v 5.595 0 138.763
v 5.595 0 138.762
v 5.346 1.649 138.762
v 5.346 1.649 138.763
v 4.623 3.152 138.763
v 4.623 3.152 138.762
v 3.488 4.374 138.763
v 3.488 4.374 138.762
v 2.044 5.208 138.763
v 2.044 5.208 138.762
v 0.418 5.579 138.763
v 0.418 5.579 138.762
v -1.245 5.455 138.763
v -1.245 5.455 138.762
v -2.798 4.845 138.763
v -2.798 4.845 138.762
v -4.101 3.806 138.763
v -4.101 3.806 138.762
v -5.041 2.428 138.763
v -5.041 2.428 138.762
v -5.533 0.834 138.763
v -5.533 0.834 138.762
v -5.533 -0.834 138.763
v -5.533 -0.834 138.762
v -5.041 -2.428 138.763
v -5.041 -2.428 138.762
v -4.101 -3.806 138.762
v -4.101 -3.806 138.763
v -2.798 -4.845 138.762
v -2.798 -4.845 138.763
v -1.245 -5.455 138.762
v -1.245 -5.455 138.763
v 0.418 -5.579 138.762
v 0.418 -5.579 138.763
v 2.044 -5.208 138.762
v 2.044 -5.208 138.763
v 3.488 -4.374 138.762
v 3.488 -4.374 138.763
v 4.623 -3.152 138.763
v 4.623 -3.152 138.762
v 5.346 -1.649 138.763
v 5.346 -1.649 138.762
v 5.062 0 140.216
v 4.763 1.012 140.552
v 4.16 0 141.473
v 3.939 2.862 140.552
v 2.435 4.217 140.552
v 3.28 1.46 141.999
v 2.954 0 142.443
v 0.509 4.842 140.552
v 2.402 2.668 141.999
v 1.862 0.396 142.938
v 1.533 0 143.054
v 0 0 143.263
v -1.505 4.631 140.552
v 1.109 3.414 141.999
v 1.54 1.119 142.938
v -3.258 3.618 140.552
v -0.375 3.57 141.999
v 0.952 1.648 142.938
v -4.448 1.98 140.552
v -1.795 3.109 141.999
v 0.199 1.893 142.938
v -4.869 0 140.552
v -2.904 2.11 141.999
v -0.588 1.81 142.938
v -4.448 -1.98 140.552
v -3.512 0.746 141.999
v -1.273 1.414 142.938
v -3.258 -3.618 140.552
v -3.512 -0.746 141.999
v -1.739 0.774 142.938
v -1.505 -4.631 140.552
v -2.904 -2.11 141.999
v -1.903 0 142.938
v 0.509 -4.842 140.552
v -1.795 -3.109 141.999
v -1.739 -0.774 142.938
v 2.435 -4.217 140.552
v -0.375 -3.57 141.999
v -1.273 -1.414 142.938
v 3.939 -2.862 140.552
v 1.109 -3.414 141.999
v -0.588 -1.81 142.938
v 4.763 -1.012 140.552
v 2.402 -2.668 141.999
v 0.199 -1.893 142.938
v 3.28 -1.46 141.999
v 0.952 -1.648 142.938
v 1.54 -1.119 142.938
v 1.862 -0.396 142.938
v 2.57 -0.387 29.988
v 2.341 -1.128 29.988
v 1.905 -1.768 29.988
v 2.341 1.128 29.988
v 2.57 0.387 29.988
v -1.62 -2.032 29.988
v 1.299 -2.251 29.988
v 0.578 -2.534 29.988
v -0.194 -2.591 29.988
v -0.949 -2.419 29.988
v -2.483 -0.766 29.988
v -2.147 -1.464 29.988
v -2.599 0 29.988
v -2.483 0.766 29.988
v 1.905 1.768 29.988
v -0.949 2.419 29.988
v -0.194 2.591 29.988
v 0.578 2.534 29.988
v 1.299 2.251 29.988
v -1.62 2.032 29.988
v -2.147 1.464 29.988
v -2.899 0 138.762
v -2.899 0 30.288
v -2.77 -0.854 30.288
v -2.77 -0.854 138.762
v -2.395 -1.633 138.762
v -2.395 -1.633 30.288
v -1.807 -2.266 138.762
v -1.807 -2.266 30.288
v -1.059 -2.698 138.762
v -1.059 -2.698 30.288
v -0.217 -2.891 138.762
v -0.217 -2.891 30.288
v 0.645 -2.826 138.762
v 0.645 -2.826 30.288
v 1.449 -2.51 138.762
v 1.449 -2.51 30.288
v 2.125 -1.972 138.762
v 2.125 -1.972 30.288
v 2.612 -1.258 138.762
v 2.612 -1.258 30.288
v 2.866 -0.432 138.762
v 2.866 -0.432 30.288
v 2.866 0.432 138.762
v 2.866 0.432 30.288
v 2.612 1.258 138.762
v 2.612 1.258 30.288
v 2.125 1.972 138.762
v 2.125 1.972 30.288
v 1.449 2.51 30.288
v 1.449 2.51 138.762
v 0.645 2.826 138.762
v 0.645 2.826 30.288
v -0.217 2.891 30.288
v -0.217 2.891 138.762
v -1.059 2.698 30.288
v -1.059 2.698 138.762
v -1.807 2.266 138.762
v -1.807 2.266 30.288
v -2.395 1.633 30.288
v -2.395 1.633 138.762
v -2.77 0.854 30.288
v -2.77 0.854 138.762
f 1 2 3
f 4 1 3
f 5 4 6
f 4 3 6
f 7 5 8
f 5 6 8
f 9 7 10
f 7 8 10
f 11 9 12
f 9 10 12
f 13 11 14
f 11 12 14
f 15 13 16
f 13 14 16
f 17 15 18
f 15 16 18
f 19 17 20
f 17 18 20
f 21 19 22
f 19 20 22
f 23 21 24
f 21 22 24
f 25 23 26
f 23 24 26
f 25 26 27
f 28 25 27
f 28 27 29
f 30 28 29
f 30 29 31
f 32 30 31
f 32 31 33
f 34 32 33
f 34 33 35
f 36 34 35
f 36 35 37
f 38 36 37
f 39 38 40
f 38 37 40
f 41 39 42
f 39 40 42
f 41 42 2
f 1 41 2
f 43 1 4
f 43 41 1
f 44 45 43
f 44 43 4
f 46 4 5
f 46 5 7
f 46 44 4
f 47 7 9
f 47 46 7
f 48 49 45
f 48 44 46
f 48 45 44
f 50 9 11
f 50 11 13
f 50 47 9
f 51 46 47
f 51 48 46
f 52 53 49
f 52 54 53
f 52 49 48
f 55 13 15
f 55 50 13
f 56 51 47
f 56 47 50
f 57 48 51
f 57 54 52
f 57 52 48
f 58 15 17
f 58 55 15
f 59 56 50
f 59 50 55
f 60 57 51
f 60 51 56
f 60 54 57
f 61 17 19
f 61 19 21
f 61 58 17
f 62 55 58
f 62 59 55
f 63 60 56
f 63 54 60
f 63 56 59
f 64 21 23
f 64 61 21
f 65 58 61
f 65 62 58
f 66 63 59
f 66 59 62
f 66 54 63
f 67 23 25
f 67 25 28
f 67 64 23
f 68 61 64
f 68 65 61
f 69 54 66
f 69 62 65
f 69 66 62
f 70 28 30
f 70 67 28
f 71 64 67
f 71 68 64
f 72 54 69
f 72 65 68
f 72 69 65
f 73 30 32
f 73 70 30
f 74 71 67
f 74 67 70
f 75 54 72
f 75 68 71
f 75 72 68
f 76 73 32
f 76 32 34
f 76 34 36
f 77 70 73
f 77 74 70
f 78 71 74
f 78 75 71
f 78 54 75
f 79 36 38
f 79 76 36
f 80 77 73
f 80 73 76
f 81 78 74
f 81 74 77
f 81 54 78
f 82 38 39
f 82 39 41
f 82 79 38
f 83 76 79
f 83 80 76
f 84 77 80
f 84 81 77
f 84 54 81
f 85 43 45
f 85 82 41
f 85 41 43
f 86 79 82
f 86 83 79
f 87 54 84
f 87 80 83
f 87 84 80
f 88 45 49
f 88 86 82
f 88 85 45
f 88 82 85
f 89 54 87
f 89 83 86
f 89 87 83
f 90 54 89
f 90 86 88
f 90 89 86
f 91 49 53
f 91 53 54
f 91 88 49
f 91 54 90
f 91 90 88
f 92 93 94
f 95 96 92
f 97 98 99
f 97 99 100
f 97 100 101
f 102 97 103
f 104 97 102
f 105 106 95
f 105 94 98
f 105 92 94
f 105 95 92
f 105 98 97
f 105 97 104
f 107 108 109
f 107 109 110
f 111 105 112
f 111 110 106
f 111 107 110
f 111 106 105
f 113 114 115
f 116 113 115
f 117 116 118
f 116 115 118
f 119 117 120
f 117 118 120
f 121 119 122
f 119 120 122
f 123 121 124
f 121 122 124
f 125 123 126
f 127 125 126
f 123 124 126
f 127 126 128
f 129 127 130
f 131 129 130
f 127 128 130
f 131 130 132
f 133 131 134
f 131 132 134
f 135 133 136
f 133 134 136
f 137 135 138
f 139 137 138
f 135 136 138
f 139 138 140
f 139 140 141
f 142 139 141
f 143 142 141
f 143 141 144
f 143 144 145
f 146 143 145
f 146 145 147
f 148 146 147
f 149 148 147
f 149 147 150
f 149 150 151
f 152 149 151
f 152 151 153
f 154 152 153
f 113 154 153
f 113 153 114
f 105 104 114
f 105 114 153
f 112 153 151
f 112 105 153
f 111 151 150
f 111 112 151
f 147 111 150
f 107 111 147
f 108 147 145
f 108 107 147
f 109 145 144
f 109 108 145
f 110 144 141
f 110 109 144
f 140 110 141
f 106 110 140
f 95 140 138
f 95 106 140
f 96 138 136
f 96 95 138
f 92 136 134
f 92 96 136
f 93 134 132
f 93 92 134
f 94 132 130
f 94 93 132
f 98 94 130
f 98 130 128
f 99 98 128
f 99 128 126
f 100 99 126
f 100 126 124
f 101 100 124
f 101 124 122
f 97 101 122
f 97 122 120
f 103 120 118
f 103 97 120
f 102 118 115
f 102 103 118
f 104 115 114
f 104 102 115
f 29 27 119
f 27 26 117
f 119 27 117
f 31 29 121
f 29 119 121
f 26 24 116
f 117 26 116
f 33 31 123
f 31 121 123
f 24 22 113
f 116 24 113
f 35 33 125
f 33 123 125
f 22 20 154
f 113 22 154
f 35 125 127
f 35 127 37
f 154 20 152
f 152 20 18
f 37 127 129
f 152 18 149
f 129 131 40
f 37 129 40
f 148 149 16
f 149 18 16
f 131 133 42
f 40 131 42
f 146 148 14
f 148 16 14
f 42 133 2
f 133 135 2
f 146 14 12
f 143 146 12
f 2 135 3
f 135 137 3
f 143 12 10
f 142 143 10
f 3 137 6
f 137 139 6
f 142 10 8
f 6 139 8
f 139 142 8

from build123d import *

# Parameters (mm, degrees)
SKETCH1_R           = 1.9325
BOSS_EXTRUDE1_DEPTH = 112.316
SKETCH2_R           = 3.730040454
BOSS_EXTRUDE2_DEPTH = 0.001
DOME1_FACE_RADIUS   = 3.730040454
DOME1_HEIGHT        = 3
SCALE1_SCALE        = 1.5
SKETCH3_R           = 2.89875
CUT_EXTRUDE1_DEPTH  = 59.7
CHAMFER1_SIZE       = 0.3


with BuildPart() as part:
    # Sketch1 → Boss-Extrude1 (new body)
    with BuildSketch(Plane.XY):
        with Locations(Location((0, 0, 0), (0, 0, 180))):
            Circle(SKETCH1_R)
    extrude(amount=BOSS_EXTRUDE1_DEPTH)

    # Sketch2 → Boss-Extrude2 (add)
    with BuildSketch(Plane.XY.offset(112.316)):
        Circle(SKETCH2_R)
    extrude(amount=BOSS_EXTRUDE2_DEPTH)

    # Dome1: a dome of height H over a round flat face of radius A is a cap of a sphere of radius (A * A + H * H) / (2 * H)
    dome1_r = (DOME1_FACE_RADIUS * DOME1_FACE_RADIUS + DOME1_HEIGHT * DOME1_HEIGHT) / (2 * DOME1_HEIGHT)
    dome1_base = Plane((0, 0, 112.317), z_dir=(0, 0, 1))
    with Locations(dome1_base.offset(DOME1_HEIGHT - dome1_r)):
        dome1_ball = Sphere(dome1_r, mode=Mode.PRIVATE)
    add(split(dome1_ball, bisect_by=dome1_base, keep=Keep.TOP, mode=Mode.PRIVATE))


with BuildPart() as part_1:
    # Scale1: scaled about (0, 0, 59.424709499)
    add(part.part.scale(SCALE1_SCALE).moved(Location((0, 0, -29.71235475))))

    # Sketch3 → Cut-Extrude1 (cut)
    with BuildSketch(Plane(origin=(0, 0, -29.712354749), x_dir=(-1, 0, 0), z_dir=(0, 0, -1))):
        Circle(SKETCH3_R)
    extrude(amount=-CUT_EXTRUDE1_DEPTH, mode=Mode.SUBTRACT)

    # Chamfer1
    chamfer1_edges = [part_1.edges().sort_by_distance(p)[0] for p in [
        (2.89875, 0, 29.987645251),
    ]]
    chamfer(chamfer1_edges, length=CHAMFER1_SIZE)


solid = part_1.part
